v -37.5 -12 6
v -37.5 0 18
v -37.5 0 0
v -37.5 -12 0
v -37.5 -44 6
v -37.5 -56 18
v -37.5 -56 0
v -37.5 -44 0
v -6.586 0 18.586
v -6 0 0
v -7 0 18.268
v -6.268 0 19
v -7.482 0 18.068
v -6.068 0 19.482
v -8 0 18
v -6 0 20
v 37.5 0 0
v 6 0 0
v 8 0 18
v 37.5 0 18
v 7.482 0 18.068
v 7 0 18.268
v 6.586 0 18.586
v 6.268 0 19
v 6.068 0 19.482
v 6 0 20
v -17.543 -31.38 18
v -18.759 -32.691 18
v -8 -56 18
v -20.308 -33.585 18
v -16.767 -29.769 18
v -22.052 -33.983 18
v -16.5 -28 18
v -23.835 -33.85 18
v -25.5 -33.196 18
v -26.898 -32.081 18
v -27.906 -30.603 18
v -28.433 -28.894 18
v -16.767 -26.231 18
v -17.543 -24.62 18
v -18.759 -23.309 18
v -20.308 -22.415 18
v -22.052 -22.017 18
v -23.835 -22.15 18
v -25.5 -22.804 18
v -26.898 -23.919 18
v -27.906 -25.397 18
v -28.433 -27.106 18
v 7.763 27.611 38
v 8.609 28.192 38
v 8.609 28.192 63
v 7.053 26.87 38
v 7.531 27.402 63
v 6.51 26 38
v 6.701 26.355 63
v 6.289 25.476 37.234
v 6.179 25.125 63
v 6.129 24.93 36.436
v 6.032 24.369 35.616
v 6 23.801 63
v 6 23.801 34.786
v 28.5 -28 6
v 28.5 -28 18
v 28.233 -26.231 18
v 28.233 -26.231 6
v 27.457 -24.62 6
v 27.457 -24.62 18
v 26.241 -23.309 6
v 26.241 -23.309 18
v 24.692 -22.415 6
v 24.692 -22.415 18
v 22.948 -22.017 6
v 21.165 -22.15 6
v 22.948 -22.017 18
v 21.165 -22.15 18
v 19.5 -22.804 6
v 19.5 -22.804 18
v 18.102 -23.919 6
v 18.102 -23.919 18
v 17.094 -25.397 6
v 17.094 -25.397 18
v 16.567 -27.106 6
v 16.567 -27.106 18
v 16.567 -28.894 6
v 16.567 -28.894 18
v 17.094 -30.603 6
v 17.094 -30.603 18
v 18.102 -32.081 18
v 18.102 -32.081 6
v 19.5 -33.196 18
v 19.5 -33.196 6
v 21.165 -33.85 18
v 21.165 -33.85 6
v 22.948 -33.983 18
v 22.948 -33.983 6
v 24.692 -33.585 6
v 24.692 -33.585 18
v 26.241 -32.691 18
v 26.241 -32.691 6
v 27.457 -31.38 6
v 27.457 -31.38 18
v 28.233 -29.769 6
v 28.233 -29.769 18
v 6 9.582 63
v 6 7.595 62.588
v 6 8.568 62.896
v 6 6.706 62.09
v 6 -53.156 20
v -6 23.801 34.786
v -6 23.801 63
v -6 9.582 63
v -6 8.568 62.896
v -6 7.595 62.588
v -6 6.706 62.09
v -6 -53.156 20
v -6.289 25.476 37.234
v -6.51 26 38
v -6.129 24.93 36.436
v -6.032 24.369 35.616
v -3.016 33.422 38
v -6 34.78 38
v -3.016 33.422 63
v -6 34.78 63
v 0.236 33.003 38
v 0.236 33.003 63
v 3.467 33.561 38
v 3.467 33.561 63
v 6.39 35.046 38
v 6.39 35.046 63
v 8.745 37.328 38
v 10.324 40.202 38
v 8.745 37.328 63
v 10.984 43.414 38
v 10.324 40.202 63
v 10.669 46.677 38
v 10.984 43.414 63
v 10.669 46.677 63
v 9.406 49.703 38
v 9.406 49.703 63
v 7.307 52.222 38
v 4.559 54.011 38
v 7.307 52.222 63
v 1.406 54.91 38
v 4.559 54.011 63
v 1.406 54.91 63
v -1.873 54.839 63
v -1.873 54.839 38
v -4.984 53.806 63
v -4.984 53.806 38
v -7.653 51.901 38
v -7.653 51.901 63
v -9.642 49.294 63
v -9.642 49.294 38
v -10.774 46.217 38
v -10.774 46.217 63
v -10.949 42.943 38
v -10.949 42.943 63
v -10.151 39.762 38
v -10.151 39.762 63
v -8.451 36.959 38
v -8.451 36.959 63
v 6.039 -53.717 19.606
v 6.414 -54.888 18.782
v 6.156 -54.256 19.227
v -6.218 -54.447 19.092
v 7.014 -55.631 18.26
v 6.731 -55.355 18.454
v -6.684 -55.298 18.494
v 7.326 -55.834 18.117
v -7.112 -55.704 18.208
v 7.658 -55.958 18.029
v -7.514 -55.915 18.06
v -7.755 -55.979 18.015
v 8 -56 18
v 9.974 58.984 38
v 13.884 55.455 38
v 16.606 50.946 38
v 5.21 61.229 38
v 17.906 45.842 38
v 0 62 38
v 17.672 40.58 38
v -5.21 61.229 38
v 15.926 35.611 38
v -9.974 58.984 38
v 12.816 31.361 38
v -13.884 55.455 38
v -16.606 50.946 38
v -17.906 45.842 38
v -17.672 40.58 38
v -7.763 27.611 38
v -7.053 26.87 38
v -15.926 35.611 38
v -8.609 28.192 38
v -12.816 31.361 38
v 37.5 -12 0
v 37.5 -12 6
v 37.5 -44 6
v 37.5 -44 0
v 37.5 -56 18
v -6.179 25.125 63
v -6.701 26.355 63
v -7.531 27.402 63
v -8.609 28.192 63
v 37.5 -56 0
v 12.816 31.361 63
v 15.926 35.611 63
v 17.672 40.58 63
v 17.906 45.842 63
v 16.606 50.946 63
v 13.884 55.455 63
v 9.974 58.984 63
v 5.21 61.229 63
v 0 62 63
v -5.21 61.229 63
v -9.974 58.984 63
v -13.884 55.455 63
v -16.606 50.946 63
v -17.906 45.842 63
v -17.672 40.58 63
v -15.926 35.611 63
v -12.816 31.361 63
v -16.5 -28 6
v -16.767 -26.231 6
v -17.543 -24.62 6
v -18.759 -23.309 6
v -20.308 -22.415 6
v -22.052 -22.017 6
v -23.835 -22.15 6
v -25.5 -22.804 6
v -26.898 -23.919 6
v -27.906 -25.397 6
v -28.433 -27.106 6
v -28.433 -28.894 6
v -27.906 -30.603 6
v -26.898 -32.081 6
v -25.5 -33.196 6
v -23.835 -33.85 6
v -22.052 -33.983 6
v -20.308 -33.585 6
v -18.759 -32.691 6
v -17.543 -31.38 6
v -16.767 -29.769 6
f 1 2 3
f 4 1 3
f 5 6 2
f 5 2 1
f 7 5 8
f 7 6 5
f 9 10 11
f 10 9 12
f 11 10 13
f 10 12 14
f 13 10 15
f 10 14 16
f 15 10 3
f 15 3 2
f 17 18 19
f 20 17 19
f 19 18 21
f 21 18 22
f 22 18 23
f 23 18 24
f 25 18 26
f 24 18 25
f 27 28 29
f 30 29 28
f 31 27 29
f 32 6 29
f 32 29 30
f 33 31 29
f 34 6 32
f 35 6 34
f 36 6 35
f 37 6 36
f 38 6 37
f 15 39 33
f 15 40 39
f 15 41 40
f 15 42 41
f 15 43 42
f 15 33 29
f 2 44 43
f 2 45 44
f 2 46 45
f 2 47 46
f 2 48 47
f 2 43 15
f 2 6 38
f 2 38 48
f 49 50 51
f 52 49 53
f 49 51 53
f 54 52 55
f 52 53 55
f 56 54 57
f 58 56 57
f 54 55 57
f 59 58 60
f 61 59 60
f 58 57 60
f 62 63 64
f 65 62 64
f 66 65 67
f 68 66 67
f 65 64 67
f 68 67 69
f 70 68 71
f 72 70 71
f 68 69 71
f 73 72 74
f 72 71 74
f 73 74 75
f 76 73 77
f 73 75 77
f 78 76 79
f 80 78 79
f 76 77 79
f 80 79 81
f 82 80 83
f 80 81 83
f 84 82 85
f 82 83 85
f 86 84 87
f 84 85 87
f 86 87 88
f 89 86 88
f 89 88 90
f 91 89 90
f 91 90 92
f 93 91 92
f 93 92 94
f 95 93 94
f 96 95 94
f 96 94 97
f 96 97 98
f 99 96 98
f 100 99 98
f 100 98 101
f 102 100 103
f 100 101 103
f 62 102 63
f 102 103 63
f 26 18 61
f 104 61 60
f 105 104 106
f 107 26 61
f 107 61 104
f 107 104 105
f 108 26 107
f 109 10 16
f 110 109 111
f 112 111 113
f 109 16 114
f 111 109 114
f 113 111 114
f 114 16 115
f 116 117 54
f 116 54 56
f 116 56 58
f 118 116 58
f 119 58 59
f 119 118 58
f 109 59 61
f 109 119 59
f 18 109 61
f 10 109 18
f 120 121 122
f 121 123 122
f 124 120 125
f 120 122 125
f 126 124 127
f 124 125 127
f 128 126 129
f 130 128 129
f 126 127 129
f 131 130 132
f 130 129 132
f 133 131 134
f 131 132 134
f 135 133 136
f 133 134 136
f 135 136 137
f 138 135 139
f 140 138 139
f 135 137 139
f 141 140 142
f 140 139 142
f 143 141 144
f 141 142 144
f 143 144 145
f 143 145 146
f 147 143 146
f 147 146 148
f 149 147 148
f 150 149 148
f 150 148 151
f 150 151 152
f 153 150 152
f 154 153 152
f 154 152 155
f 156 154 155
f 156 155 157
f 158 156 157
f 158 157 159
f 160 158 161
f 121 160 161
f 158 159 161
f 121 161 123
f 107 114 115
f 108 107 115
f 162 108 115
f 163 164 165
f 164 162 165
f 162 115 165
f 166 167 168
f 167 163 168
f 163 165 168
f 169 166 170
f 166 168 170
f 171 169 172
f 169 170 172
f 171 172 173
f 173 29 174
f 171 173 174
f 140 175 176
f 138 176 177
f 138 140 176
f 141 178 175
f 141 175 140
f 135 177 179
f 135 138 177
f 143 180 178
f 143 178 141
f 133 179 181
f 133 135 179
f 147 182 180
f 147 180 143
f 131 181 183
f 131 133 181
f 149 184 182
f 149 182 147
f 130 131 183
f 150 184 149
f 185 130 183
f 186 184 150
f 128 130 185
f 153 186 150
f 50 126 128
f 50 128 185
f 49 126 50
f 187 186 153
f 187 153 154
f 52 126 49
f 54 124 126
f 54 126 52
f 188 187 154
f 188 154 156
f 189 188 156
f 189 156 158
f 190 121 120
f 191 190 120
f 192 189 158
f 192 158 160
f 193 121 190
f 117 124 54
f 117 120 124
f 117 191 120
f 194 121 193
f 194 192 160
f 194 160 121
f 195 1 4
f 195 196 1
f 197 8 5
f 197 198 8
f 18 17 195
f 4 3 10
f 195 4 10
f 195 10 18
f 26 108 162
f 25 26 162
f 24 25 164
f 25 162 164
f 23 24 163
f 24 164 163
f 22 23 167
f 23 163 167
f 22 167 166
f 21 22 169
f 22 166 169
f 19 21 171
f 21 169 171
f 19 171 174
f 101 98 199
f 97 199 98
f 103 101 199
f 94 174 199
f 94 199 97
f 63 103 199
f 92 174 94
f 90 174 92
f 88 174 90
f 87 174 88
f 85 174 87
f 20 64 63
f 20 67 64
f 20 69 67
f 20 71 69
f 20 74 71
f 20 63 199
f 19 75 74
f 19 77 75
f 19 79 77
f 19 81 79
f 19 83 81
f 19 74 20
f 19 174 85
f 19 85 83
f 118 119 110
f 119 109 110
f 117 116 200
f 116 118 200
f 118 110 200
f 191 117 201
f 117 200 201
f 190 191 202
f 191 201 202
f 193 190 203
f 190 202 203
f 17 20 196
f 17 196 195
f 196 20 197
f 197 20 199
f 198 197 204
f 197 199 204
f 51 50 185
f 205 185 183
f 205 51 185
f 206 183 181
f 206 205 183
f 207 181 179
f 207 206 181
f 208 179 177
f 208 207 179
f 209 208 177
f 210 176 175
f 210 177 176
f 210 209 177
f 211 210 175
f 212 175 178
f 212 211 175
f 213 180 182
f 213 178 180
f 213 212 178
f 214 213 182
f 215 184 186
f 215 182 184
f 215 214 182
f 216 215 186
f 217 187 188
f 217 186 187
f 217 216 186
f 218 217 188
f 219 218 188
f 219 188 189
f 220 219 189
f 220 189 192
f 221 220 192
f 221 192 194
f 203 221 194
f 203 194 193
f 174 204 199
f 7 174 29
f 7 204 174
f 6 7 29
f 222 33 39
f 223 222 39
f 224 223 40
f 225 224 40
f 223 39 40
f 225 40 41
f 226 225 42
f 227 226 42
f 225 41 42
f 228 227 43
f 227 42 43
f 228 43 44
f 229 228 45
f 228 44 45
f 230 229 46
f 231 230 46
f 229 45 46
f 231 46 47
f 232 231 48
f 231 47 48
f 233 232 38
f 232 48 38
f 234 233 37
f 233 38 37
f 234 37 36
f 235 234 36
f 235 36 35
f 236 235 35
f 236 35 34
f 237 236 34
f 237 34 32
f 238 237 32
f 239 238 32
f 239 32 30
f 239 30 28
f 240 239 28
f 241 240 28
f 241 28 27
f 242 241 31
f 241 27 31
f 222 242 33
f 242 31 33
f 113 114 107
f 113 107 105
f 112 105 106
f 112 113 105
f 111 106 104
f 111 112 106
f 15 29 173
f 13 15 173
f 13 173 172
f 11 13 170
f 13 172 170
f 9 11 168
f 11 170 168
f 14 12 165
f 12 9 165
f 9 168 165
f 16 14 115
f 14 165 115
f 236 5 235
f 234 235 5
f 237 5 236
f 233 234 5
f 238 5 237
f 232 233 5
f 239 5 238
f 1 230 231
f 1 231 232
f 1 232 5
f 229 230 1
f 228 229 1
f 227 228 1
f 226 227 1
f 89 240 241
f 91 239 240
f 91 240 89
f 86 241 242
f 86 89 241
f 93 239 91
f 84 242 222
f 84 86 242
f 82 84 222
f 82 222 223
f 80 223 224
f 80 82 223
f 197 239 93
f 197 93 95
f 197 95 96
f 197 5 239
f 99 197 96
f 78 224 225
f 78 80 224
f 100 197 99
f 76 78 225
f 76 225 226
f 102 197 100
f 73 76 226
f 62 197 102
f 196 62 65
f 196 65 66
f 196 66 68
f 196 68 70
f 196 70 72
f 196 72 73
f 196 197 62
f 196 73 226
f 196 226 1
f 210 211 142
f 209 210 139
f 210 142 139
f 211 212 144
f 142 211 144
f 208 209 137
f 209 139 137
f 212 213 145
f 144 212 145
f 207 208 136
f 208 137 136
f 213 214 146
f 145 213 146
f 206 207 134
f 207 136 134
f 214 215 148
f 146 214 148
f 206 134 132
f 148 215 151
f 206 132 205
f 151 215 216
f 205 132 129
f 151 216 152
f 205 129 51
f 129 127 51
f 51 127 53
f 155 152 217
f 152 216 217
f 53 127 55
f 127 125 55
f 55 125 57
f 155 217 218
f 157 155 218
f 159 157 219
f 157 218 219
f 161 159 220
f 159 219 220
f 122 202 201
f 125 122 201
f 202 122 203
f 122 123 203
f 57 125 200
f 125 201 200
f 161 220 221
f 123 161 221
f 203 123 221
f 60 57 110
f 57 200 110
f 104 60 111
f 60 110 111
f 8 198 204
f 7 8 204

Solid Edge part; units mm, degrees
sketch "Sketch1" plane through (0, 0, 0) normal (1, 0, 0) x (0, 1, 0)
  line L0 (0, 0) -> (-56, 0)
  line L1 (-56, 0) -> (-56, 18)
  line L2 (-56, 18) -> (0, 18)
  line L3 (0, 0) -> (0, 18)
extrude "Protrusion1" add sketch "Sketch1" along normal mid plane 75
sketch "Sketch2" plane through (37.5, -28, 9) normal (1, 0, 0) x (0, 1, 0)
  line L0 (-16, -9) -> (-16, -3)
  line L1 (-16, -3) -> (16, -3)
  line L2 (16, -3) -> (16, -9)
  line L3 (16, -9) -> (-16, -9)
extrude "ExtrudedCutout_1" cut sketch "Sketch2" against normal blind 100.4669
sketch "Sketch3" plane through (21.75, -28, 18) normal (0, 0, 1) x (1, 0, 0)
  circle A0 centre (0.75, 0) radius 6
  circle A1 centre (-44.25, 0) radius 6
extrude "ExtrudedCutout_2" cut sketch "Sketch3" against normal blind 51.1698
sketch "Sketch4" plane through (0, 0, 0) normal (1, 0, 0) x (0, 1, 0)
  line L0 (8, 63) -> (-56, 18)
  line L1 (-56, 18) -> (0, 18)
  line L2 (0, 0) -> (0, 18)
  line L3 (26, 38) -> (0, 0)
  line L4 (44, 38) -> (26, 38)
  line L5 (44, 38) -> (44, 63)
  line L6 (44, 63) -> (8, 63)
extrude "Protrusion_2" add sketch "Sketch4" along normal mid plane 12
sketch "Sketch5" plane through (0, 26, 63) normal (0, 0, 1) x (0, 1, 0)
  circle A0 centre (18, 0) radius 18
  circle A1 centre (18, 0) radius 11
extrude "Protrusion_3" add sketch "Sketch5" against normal blind 25
sketch "Sketch6" plane through (0, 26, 63) normal (0, 0, 1) x (0, 1, 0)
  circle A0 centre (18, 0) radius 11
extrude "Cutout_3" cut sketch "Sketch6" against normal blind 55.1556
fillet "Round_1" radius 5 3 edges at (0, 8, 63) (6, 27.0294, 50.5) (-6, 27.0294, 50.5)
fillet "Round1" radius 2 2 edges at (6, -28, 18) (-6, -28, 18)
